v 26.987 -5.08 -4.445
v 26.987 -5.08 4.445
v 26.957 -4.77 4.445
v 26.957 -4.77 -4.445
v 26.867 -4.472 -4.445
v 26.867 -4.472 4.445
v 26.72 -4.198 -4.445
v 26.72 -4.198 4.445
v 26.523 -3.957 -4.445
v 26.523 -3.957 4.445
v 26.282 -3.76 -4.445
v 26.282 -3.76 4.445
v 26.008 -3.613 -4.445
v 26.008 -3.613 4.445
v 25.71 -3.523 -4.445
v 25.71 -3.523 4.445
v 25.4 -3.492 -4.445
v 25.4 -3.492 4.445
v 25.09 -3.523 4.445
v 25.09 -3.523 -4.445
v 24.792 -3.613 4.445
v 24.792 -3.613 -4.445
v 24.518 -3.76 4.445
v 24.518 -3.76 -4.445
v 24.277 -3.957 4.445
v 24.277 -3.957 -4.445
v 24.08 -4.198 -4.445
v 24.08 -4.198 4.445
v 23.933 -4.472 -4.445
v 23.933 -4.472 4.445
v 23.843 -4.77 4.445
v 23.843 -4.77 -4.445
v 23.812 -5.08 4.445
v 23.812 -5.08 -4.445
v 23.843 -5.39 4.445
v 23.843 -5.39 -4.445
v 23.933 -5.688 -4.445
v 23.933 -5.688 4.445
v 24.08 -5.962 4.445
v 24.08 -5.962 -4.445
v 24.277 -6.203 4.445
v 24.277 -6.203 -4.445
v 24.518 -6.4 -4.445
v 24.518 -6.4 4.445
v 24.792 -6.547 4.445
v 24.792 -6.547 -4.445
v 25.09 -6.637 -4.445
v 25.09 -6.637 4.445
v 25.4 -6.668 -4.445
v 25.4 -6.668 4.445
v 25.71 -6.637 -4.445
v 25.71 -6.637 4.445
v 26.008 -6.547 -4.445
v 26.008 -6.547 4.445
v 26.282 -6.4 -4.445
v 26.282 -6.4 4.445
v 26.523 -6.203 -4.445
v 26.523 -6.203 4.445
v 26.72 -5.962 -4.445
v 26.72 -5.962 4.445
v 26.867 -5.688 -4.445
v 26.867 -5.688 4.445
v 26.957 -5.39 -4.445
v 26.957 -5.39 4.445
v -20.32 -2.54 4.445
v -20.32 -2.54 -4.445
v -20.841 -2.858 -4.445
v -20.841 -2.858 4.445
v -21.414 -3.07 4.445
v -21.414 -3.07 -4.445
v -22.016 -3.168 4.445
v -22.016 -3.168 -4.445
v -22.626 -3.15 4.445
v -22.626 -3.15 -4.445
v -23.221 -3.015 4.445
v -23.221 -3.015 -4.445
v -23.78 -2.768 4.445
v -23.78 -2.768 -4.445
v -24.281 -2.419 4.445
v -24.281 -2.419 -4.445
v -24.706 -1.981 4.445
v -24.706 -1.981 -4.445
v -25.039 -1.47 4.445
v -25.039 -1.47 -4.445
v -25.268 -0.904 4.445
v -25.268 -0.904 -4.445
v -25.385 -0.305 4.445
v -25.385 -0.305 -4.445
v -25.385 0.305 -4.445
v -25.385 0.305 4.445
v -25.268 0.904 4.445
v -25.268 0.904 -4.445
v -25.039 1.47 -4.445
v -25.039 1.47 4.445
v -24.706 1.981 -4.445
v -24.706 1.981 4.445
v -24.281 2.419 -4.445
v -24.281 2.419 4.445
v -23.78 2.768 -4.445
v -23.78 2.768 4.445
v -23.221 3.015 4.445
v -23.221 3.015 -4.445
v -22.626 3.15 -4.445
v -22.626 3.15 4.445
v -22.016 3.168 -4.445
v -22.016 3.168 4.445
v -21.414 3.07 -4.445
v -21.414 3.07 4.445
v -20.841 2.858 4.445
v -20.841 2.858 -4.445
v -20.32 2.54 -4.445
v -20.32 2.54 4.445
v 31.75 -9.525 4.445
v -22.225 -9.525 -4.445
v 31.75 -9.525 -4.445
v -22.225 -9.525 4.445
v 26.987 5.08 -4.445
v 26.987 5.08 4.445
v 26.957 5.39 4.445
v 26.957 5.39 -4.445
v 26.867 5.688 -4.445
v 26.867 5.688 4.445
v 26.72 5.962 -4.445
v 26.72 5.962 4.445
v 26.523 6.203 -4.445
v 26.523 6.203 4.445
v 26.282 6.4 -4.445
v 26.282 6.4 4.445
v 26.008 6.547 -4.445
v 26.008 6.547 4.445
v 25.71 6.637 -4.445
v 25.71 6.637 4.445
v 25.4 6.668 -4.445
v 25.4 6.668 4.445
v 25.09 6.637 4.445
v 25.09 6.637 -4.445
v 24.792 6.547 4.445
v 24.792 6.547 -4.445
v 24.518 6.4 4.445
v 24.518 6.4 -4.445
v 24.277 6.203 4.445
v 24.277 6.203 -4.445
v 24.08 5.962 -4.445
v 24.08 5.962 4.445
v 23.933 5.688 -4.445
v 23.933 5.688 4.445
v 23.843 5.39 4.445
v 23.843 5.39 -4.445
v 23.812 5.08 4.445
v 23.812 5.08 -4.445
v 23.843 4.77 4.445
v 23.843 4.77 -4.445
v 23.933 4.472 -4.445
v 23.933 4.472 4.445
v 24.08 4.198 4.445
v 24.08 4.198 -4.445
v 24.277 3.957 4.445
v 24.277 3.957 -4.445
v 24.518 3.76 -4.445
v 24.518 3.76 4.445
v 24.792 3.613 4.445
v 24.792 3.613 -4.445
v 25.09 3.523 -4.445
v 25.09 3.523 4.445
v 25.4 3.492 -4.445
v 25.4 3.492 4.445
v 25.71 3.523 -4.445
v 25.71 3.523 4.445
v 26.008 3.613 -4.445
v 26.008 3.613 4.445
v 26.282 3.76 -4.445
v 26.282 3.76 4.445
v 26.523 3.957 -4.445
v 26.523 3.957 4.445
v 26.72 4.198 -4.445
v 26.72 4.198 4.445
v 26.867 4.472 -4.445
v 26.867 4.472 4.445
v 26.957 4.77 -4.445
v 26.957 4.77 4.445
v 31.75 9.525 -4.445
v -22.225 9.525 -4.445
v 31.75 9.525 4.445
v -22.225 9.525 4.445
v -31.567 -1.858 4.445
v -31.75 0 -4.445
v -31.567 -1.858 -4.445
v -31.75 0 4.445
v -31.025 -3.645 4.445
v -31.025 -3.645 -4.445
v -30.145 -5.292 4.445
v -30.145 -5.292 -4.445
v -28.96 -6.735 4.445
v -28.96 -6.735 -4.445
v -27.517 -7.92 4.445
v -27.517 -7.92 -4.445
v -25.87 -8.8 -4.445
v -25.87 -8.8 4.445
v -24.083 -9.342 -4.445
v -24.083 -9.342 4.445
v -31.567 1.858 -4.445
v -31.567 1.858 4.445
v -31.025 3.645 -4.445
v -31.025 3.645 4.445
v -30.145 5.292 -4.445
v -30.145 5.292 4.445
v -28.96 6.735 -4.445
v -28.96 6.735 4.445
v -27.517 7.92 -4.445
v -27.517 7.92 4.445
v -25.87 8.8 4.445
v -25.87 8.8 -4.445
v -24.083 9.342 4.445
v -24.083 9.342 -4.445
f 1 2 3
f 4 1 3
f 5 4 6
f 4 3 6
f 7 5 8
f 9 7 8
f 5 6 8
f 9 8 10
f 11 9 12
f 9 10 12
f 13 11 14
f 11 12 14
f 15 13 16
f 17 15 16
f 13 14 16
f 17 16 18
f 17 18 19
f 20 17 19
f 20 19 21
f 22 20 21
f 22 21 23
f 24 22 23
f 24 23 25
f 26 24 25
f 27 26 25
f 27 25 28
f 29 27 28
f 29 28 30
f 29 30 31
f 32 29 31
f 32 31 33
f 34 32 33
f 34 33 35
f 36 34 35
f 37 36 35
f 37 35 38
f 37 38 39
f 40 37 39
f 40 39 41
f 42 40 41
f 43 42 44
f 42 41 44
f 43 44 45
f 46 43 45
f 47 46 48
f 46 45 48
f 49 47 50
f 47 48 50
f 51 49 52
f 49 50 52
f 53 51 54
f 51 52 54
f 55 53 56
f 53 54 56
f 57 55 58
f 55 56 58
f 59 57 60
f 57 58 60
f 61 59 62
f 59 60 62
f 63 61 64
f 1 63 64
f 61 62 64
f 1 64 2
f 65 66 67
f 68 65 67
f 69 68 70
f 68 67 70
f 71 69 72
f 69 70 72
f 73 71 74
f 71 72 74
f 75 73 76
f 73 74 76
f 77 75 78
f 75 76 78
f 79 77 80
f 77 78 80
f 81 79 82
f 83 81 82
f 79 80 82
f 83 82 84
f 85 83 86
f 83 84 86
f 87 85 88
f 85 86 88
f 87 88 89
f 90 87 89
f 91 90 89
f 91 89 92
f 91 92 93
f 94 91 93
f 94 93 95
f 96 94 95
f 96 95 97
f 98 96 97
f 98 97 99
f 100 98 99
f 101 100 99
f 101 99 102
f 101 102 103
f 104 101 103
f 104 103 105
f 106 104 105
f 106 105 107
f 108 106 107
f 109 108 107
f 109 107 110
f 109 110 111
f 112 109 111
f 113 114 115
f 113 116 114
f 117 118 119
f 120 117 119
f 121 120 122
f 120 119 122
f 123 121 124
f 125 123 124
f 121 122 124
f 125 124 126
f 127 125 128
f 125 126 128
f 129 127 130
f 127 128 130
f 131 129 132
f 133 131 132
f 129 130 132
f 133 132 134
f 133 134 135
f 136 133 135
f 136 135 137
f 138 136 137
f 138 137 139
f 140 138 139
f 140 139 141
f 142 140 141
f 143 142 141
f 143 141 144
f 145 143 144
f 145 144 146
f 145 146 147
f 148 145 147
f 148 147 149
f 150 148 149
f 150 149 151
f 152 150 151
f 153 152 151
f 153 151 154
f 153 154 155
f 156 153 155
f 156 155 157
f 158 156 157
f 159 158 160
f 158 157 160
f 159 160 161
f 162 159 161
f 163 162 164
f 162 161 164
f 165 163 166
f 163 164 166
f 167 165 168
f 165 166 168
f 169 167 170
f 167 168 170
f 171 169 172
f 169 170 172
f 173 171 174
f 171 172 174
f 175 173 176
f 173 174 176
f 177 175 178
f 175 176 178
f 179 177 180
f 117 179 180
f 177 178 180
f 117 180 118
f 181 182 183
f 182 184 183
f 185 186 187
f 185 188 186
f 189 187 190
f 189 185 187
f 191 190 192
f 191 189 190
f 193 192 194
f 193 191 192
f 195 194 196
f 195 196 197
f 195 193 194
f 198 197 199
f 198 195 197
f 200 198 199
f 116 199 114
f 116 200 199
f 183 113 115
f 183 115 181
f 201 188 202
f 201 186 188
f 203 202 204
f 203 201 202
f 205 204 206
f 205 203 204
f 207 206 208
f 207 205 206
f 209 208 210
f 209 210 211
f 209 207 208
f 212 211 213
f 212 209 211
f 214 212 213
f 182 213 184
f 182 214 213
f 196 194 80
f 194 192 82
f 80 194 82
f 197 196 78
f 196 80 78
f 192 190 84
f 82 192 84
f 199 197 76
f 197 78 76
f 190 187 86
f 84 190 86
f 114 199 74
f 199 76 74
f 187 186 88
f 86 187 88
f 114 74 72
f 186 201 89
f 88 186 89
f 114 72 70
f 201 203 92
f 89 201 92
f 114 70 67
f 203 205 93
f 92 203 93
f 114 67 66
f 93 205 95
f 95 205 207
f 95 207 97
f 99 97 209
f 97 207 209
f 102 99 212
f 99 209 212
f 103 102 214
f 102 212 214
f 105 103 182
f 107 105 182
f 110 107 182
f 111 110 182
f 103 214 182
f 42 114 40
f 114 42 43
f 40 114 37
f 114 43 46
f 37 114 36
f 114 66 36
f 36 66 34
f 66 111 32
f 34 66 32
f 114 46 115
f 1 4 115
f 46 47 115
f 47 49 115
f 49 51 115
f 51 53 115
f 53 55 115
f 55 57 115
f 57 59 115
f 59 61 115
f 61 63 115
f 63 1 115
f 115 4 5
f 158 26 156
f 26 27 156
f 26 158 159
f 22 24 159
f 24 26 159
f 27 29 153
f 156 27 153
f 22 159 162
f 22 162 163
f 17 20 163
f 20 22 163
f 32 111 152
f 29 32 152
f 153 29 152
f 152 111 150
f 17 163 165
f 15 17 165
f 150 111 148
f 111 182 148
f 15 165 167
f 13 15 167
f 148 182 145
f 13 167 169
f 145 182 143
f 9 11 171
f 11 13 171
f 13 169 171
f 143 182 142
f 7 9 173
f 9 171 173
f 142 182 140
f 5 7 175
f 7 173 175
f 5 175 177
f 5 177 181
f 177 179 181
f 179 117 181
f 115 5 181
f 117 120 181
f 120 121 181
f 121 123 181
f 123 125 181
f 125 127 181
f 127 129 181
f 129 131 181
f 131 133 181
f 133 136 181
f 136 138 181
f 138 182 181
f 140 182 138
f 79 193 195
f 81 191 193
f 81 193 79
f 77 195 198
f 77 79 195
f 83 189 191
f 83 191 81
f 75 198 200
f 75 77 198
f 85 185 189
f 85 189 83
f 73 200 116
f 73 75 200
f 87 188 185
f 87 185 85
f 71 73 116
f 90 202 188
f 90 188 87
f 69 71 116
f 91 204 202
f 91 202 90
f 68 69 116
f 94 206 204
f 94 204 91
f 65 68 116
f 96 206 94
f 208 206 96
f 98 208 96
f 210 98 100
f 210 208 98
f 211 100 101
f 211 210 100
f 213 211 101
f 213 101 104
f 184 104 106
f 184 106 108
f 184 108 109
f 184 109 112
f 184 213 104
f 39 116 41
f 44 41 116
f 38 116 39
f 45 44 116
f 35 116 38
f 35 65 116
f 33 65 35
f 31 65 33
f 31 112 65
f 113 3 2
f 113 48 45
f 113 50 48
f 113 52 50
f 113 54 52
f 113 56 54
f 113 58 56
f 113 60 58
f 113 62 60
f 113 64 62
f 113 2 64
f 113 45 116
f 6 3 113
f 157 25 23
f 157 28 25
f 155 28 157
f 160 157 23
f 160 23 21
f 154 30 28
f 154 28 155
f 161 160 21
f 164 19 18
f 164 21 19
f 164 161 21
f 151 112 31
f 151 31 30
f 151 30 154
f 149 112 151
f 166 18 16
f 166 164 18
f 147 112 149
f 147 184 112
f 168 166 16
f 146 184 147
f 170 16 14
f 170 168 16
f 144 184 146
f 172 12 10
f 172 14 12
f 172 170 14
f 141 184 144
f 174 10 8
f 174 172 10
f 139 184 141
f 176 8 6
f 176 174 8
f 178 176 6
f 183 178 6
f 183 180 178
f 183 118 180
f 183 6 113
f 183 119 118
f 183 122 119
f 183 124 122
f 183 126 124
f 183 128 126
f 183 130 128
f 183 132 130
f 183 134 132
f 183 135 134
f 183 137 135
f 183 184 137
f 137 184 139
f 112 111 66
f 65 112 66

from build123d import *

# Parameters (mm, degrees)
SKETCH1_W               = 63.5
SKETCH1_H               = 19.05
BOSS_EXTRUDE1_DEPTH     = 4.445
SKETCH2_R               = 1.5875
CUT_EXTRUDE1_DEPTH      = 12.7
FILLET1_R               = 9.525
CUT_EXTRUDE2_DEPTH      = 35.319385557
CUT_EXTRUDE2_DEPTH_BACK = 35.319385557


with BuildPart() as part:
    # Sketch1 → Boss-Extrude1 (new, symmetric)
    with BuildSketch(Plane.XY):
        Rectangle(SKETCH1_W, SKETCH1_H)
    extrude(amount=BOSS_EXTRUDE1_DEPTH, both=True)

    # Sketch2 → Cut-Extrude1 (cut)
    with BuildSketch(Plane.XY.offset(4.445)):
        with Locations((25.4, 5.08)):
            Circle(SKETCH2_R)
        with Locations((25.4, -5.08)):
            Circle(SKETCH2_R)
    extrude(amount=-CUT_EXTRUDE1_DEPTH, mode=Mode.SUBTRACT)

    # Fillet1
    fillet1_edges = [part.edges().sort_by_distance(p)[0] for p in [
        (-31.75, -9.525, 0),
        (-31.75, 9.525, 0),
    ]]
    fillet(fillet1_edges, radius=FILLET1_R - 0.0001)  # a hair under: the kernel refuses the full size

    # Sketch3 → Cut-Extrude2 (cut, two sides: drawn at the far end of the back side and taken through both)
    with BuildSketch(Plane.XY.offset(4.445).offset(-CUT_EXTRUDE2_DEPTH_BACK)):
        with BuildLine():
            Line((-20.32, 2.54), (-20.32, -2.54))
            ThreePointArc((-20.32, -2.54), (-25.4, 0), (-20.32, 2.54))
        make_face()
    extrude(amount=CUT_EXTRUDE2_DEPTH + CUT_EXTRUDE2_DEPTH_BACK, mode=Mode.SUBTRACT)


solid = part.part
